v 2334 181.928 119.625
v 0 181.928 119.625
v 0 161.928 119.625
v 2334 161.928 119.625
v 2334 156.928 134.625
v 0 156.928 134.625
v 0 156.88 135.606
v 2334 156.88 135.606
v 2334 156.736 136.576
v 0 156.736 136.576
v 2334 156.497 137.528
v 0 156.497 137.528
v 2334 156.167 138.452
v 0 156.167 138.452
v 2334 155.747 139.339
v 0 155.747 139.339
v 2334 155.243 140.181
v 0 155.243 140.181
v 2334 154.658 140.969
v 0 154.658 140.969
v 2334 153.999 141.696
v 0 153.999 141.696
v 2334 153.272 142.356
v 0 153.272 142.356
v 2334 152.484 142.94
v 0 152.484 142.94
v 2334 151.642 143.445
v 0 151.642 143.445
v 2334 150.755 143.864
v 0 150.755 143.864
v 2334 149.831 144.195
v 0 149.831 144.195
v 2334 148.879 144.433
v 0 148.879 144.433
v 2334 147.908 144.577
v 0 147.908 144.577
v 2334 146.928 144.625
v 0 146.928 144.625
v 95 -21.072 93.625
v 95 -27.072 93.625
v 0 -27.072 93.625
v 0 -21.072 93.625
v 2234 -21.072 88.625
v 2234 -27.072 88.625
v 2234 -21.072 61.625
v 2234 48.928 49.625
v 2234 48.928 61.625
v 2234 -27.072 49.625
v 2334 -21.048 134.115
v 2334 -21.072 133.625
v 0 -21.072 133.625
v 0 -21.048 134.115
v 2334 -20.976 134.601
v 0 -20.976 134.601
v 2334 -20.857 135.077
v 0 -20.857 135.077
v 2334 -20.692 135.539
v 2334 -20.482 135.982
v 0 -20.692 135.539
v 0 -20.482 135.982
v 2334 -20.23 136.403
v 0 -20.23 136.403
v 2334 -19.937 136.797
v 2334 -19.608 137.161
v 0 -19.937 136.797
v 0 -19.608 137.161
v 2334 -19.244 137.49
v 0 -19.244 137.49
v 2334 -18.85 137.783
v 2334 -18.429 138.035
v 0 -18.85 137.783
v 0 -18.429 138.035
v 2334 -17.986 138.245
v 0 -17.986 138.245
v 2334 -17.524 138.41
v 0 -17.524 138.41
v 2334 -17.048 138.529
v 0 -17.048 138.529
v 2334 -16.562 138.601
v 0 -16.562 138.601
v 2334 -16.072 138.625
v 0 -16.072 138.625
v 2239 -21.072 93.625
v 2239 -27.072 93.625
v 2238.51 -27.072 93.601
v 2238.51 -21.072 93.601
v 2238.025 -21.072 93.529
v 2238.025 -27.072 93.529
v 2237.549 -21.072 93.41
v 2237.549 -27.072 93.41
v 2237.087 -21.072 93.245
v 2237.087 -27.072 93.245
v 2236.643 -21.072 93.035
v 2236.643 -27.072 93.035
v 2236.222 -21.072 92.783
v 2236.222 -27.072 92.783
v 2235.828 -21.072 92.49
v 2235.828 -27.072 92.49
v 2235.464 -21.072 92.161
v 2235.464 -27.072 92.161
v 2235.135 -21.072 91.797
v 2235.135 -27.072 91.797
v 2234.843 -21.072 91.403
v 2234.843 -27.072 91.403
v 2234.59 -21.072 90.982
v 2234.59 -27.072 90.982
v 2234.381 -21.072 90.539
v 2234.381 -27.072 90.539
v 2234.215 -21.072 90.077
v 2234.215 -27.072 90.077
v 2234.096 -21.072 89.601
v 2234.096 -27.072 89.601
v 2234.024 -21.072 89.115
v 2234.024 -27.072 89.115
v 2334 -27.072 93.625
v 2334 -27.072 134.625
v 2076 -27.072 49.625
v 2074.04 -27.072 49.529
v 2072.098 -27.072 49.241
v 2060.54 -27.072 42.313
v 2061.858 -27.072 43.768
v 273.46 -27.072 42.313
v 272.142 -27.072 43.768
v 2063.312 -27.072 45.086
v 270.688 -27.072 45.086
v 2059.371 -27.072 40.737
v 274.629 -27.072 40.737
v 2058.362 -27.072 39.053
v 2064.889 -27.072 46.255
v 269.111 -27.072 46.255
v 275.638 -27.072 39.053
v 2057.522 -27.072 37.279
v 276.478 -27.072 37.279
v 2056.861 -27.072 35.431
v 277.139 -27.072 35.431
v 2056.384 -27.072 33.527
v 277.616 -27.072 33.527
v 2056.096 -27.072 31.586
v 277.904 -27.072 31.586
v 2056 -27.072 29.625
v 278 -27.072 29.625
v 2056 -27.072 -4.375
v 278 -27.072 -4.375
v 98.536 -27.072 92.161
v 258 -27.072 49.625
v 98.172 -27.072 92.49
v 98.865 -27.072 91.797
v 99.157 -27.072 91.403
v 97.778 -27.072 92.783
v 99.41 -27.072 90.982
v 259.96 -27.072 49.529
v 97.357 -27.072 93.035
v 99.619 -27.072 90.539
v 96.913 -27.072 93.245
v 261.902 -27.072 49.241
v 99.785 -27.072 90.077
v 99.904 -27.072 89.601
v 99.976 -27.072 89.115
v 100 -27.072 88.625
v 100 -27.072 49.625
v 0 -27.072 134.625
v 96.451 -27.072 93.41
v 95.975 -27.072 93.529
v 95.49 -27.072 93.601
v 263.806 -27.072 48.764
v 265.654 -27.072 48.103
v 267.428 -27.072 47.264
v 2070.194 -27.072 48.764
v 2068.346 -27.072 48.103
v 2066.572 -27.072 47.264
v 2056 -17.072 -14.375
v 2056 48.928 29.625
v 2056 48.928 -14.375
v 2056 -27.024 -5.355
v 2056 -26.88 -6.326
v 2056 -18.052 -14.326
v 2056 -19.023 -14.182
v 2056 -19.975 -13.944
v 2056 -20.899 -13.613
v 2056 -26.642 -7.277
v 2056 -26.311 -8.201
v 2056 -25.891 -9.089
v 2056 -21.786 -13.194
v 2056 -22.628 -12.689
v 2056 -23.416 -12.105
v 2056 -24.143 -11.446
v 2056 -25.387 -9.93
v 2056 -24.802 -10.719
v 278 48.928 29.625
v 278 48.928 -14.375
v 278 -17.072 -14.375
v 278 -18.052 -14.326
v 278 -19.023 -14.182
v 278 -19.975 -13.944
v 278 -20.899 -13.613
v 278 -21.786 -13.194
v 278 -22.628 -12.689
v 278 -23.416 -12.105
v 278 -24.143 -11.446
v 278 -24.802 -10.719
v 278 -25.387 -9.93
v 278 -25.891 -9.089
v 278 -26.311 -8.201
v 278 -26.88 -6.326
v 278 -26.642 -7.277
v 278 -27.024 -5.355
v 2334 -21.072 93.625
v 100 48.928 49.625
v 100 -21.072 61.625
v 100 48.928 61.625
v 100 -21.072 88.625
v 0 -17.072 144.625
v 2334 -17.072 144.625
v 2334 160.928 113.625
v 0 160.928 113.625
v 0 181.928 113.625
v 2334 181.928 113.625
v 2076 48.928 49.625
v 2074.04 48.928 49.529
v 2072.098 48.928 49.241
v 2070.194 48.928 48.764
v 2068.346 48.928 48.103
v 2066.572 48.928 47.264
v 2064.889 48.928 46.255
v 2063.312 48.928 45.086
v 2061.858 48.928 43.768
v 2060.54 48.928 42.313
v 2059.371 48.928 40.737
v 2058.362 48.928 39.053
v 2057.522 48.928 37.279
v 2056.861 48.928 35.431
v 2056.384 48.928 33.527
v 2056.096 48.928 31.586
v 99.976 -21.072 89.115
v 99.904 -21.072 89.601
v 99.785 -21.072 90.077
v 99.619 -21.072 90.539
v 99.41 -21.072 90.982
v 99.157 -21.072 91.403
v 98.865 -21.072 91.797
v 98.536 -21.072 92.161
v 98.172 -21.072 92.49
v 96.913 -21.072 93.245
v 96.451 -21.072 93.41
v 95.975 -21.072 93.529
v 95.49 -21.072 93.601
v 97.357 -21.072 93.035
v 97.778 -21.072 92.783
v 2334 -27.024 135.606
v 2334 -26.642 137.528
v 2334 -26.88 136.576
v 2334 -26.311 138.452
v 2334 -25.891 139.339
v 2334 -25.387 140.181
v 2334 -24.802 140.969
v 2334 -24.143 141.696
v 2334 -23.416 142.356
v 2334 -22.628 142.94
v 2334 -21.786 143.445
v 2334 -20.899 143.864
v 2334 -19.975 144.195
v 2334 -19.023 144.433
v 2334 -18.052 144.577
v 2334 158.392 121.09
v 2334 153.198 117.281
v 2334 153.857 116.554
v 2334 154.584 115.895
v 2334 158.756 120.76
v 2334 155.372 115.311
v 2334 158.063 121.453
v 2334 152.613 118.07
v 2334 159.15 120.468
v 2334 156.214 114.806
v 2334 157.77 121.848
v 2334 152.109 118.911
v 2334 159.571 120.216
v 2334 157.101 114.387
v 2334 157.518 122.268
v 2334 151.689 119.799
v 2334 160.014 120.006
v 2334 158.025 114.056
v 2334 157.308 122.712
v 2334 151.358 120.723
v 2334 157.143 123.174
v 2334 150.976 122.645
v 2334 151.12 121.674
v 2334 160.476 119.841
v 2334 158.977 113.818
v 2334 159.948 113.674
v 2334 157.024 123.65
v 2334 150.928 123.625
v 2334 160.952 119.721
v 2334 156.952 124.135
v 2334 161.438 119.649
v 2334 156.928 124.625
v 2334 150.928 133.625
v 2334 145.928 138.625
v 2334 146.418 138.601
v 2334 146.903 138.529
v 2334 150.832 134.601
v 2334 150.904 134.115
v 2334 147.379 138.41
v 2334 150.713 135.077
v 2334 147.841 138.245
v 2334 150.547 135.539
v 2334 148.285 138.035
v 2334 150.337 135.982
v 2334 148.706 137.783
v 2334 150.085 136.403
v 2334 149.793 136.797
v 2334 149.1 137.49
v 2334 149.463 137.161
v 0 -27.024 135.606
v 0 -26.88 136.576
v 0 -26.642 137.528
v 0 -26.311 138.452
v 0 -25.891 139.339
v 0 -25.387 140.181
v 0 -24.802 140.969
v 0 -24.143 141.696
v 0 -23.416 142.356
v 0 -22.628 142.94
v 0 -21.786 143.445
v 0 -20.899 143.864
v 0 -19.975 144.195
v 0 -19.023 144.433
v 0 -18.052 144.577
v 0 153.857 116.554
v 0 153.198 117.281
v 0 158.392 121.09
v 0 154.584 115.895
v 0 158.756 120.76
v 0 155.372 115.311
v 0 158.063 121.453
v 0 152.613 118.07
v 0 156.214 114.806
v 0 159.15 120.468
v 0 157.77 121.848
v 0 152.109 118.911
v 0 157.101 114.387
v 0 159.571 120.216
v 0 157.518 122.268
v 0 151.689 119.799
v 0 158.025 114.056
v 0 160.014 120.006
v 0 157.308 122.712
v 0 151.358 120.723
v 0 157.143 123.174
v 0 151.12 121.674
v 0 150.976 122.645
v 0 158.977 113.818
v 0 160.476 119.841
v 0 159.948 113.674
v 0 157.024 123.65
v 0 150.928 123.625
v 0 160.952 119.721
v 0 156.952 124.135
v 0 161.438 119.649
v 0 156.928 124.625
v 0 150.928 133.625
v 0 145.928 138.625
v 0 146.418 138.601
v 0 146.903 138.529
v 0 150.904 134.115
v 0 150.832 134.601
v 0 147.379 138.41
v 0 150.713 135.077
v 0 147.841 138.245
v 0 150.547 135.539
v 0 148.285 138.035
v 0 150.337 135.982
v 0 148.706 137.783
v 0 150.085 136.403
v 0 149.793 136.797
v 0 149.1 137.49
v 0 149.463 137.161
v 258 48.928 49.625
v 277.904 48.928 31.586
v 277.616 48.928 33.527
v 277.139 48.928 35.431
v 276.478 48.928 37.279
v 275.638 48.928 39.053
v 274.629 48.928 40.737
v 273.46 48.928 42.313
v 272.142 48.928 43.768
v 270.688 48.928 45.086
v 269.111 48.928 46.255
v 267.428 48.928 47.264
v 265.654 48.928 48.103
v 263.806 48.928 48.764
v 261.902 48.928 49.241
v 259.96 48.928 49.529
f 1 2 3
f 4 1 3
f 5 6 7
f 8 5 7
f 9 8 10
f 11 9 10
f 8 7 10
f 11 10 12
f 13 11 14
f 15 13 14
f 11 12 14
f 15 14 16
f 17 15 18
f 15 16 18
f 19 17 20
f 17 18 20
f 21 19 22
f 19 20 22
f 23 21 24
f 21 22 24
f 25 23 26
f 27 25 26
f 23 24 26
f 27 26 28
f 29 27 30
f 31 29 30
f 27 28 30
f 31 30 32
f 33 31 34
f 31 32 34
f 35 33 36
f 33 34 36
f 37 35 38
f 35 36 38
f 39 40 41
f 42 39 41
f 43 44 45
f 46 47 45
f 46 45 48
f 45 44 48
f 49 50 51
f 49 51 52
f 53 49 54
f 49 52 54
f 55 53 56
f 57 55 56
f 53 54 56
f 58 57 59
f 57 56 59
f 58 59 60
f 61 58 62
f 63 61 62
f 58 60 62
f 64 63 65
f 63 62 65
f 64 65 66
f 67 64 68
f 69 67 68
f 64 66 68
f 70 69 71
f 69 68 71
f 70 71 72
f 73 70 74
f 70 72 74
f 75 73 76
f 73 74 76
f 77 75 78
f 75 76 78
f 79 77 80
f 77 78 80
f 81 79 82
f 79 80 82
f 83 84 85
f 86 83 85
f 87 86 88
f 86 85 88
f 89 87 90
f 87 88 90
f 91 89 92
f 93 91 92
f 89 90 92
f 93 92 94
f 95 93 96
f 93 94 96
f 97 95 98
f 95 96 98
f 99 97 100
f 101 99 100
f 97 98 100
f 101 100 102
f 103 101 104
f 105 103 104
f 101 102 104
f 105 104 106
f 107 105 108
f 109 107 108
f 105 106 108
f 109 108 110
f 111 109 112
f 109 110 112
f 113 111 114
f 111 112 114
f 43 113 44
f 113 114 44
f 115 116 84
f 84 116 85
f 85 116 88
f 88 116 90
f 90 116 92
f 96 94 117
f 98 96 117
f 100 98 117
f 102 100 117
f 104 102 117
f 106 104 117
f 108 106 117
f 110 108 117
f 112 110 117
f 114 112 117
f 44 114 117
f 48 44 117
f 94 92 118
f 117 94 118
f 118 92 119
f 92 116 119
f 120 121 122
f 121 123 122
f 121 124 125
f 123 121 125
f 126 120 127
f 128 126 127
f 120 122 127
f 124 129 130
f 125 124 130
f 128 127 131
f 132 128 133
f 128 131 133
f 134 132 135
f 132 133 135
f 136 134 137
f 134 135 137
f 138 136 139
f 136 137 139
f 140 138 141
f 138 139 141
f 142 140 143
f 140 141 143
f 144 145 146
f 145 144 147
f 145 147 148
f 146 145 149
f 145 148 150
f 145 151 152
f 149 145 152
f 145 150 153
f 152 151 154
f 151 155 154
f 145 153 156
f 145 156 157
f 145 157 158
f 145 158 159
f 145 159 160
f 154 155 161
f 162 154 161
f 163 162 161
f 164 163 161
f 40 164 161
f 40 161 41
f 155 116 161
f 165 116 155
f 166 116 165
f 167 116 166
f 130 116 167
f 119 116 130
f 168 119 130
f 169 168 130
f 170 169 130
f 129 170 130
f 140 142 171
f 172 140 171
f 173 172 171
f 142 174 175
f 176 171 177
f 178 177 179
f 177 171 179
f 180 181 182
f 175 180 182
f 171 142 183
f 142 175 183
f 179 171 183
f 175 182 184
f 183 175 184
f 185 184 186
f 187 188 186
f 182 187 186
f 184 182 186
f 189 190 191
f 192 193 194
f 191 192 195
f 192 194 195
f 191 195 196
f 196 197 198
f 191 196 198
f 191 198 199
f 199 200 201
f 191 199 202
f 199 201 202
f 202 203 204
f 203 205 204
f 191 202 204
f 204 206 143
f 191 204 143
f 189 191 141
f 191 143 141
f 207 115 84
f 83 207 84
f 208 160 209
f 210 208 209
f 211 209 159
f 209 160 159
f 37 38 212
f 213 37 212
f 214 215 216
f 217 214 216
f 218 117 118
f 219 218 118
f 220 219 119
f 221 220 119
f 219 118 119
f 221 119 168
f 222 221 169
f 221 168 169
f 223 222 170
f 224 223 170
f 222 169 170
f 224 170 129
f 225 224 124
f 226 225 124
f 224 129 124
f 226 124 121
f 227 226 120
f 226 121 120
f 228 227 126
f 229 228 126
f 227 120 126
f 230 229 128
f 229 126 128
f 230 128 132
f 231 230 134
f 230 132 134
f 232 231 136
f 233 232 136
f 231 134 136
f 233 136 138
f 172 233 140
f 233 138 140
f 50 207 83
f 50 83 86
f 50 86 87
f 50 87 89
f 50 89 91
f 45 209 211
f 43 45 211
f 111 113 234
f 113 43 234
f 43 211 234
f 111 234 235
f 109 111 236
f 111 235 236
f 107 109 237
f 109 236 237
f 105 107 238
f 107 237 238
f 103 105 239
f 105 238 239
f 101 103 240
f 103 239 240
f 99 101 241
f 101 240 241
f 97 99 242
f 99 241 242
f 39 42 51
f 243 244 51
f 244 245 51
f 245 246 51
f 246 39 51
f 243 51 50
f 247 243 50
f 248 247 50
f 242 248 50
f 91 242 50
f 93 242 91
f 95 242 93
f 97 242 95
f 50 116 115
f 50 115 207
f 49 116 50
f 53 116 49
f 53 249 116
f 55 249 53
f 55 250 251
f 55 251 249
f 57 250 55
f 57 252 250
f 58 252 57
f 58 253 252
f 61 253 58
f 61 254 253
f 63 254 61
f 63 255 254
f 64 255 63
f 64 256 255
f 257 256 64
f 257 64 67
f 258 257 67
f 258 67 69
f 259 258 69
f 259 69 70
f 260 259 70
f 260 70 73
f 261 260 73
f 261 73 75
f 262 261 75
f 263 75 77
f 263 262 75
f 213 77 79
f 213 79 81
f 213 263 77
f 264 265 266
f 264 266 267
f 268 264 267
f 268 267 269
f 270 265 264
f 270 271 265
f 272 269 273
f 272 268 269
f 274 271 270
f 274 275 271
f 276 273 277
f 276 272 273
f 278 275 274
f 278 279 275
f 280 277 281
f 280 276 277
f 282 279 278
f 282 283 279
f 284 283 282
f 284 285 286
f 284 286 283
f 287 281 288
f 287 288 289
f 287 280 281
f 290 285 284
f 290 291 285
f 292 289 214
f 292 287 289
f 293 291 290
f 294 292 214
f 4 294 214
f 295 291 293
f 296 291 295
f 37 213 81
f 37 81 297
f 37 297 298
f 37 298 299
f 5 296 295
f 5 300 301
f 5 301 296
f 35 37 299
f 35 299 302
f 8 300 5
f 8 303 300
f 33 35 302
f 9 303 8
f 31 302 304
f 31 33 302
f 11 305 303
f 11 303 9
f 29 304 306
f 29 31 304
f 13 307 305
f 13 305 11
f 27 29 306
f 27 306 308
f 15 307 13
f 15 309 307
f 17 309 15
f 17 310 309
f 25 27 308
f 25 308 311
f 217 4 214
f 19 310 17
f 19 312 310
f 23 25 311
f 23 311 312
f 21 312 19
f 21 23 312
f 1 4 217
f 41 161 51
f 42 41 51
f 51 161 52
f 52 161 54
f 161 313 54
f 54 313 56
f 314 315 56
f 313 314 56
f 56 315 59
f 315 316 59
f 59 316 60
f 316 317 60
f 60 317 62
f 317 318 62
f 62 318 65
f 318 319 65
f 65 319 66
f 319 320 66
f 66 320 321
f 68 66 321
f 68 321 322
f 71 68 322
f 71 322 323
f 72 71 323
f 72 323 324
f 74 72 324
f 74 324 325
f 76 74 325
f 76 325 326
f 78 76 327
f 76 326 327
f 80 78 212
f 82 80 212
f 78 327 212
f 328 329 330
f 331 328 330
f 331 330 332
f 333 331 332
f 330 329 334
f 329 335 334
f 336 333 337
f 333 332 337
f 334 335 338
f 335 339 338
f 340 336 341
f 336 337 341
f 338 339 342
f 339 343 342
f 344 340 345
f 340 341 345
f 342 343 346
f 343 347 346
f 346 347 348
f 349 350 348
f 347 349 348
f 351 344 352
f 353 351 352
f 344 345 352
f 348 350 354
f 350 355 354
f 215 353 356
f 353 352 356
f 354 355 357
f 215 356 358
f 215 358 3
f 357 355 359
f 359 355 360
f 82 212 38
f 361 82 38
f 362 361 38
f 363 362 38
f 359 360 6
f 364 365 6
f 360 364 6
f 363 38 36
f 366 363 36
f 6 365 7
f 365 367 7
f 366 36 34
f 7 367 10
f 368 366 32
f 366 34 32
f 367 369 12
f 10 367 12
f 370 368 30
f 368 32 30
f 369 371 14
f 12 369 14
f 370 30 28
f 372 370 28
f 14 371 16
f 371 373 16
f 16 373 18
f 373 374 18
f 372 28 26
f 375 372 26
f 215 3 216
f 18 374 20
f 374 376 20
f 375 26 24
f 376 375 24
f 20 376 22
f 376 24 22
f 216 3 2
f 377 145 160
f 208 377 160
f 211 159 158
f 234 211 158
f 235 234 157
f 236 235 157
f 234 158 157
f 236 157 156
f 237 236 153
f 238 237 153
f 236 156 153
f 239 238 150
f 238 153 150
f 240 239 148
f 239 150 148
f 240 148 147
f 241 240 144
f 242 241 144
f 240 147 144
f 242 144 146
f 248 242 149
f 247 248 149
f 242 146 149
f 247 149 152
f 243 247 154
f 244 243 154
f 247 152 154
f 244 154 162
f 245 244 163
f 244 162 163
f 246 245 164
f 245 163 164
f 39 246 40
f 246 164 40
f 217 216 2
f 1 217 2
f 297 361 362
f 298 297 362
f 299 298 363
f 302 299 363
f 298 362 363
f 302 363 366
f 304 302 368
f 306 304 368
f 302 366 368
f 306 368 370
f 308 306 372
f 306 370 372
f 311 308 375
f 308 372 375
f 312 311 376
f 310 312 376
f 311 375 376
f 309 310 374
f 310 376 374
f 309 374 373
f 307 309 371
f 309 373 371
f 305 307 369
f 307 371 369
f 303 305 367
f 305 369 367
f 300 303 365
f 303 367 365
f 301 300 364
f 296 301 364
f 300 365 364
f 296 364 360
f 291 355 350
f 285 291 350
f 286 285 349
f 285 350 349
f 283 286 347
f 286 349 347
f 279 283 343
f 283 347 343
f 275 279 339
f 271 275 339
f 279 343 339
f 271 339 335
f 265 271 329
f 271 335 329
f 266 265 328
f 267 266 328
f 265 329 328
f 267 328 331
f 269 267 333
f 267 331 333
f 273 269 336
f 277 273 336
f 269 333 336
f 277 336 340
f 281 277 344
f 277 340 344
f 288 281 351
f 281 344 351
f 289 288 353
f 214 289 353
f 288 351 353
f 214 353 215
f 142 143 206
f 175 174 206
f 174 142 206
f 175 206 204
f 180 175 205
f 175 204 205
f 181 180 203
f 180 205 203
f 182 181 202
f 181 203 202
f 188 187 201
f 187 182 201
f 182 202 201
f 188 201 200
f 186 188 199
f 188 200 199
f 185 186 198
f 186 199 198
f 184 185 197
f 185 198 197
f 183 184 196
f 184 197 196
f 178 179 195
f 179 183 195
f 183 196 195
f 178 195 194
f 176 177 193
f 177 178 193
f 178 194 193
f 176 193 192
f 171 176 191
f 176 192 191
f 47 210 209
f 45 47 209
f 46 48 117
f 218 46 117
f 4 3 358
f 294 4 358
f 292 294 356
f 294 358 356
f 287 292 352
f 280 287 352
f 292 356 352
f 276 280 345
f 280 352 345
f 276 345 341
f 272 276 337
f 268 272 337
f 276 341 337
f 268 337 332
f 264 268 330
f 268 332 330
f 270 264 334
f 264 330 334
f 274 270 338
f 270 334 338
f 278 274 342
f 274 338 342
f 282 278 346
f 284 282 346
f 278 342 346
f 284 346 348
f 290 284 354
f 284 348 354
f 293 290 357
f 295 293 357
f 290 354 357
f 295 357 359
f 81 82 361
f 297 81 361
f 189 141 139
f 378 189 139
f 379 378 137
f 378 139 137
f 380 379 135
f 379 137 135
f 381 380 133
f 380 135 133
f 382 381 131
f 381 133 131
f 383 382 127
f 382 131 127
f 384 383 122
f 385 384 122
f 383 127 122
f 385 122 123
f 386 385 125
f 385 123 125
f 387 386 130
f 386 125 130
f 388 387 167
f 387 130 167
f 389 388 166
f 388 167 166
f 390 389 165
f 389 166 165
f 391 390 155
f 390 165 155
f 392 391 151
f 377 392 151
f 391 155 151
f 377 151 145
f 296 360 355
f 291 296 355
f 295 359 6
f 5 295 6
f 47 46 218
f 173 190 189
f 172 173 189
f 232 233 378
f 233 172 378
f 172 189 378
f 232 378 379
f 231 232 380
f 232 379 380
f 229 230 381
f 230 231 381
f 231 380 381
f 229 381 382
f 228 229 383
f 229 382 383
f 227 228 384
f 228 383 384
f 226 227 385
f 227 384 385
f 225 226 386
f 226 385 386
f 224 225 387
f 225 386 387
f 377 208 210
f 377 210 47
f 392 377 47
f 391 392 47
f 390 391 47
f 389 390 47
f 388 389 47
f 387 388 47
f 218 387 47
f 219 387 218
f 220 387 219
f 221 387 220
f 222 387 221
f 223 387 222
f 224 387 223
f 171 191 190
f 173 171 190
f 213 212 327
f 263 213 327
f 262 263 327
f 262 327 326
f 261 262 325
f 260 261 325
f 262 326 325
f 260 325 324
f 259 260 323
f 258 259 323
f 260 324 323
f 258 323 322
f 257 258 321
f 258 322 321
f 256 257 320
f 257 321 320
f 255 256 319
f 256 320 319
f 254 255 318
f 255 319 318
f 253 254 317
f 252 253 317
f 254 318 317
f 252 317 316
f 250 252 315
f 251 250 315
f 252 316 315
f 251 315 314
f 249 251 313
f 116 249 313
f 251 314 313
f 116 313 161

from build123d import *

# Parameters (mm, degrees)
F1_DEPTH = 2334
F2_W     = 278
F2_H     = 26
F3_DEPTH = 80
F4_DEPTH = 80


with BuildPart() as f1:
    # F0 (on Right) → F1 (new body)
    with BuildSketch(Plane.YZ):
        with BuildLine():
            Line((181.927831, 113.625399), (181.927831, 119.625399))
            Line((181.927831, 119.625399), (161.927831, 119.625399))
            ThreePointArc((161.927831, 119.625399), (158.392297, 121.089865), (156.927831, 124.625399))
            Line((156.927831, 124.625399), (156.927831, 134.625399))
            ThreePointArc((156.927831, 134.625399), (153.998899, 141.696467), (146.927831, 144.625399))
            Line((146.927831, 144.625399), (-17.072169, 144.625399))
            ThreePointArc((-17.072169, 144.625399), (-24.143237, 141.696467), (-27.072169, 134.625399))
            Line((-27.072169, 134.625399), (-27.072169, 61.625399))
            Line((-27.072169, 61.625399), (-21.072169, 61.625399))
            Line((-21.072169, 61.625399), (-21.072169, 133.625399))
            ThreePointArc((-21.072169, 133.625399), (-19.607703, 137.160933), (-16.072169, 138.625399))
            Line((-16.072169, 138.625399), (145.927831, 138.625399))
            ThreePointArc((145.927831, 138.625399), (149.463365, 137.160933), (150.927831, 133.625399))
            Line((150.927831, 133.625399), (150.927831, 123.625399))
            ThreePointArc((150.927831, 123.625399), (153.856763, 116.554331), (160.927831, 113.625399))
            Line((160.927831, 113.625399), (181.927831, 113.625399))
        make_face()
        with BuildLine():
            Line((-21.072169, 61.625399), (-27.072169, 61.625399))
            Line((-27.072169, 61.625399), (-27.072169, -4.374601))
            ThreePointArc((-27.072169, -4.374601), (-24.143237, -11.445669), (-17.072169, -14.374601))
            Line((-17.072169, -14.374601), (48.927831, -14.374601))
            Line((48.927831, -14.374601), (48.927831, -8.374601))
            Line((48.927831, -8.374601), (48.927831, 61.625399))
            Line((48.927831, 61.625399), (-21.072169, 61.625399))
        make_face()
    extrude(amount=F1_DEPTH)

    # F2 (on face) → F3 (cut)
    with BuildSketch(Plane.XZ.offset(27.072169)):
        with Locations((139, -17.374601)):
            Rectangle(F2_W, F2_H)
        with BuildLine():
            Line((95, 93.625399), (0, 93.625399))
            Line((0, 93.625399), (0, -4.374601))
            Line((0, -4.374601), (278, -4.374601))
            Line((278, -4.374601), (278, 29.625399))
            ThreePointArc((278, 29.625399), (272.142136, 43.767535), (258, 49.625399))
            Line((258, 49.625399), (100, 49.625399))
            Line((100, 49.625399), (100, 88.625399))
            ThreePointArc((100, 88.625399), (98.535534, 92.160933), (95, 93.625399))
        make_face()
    extrude(amount=-F3_DEPTH, mode=Mode.SUBTRACT)

    # F2 (on face) → F4 (cut)
    with BuildSketch(Plane.XZ.offset(27.072169)):
        with BuildLine():
            Line((2056, 29.625399), (2056, -4.374601))
            Line((2056, -4.374601), (2334, -4.374601))
            Line((2334, -4.374601), (2334, 93.625399))
            Line((2334, 93.625399), (2239, 93.625399))
            ThreePointArc((2239, 93.625399), (2235.464466, 92.160933), (2234, 88.625399))
            Line((2234, 88.625399), (2234, 49.625399))
            Line((2234, 49.625399), (2076, 49.625399))
            ThreePointArc((2076, 49.625399), (2061.857864, 43.767535), (2056, 29.625399))
        make_face()
        Polygon((2334, -4.374601), (2056, -4.374601), (2056, -14.374601), (2056, -32.294646), (2334, -32.294646), align=None)
    extrude(amount=-F4_DEPTH, mode=Mode.SUBTRACT)


solid = f1.part
